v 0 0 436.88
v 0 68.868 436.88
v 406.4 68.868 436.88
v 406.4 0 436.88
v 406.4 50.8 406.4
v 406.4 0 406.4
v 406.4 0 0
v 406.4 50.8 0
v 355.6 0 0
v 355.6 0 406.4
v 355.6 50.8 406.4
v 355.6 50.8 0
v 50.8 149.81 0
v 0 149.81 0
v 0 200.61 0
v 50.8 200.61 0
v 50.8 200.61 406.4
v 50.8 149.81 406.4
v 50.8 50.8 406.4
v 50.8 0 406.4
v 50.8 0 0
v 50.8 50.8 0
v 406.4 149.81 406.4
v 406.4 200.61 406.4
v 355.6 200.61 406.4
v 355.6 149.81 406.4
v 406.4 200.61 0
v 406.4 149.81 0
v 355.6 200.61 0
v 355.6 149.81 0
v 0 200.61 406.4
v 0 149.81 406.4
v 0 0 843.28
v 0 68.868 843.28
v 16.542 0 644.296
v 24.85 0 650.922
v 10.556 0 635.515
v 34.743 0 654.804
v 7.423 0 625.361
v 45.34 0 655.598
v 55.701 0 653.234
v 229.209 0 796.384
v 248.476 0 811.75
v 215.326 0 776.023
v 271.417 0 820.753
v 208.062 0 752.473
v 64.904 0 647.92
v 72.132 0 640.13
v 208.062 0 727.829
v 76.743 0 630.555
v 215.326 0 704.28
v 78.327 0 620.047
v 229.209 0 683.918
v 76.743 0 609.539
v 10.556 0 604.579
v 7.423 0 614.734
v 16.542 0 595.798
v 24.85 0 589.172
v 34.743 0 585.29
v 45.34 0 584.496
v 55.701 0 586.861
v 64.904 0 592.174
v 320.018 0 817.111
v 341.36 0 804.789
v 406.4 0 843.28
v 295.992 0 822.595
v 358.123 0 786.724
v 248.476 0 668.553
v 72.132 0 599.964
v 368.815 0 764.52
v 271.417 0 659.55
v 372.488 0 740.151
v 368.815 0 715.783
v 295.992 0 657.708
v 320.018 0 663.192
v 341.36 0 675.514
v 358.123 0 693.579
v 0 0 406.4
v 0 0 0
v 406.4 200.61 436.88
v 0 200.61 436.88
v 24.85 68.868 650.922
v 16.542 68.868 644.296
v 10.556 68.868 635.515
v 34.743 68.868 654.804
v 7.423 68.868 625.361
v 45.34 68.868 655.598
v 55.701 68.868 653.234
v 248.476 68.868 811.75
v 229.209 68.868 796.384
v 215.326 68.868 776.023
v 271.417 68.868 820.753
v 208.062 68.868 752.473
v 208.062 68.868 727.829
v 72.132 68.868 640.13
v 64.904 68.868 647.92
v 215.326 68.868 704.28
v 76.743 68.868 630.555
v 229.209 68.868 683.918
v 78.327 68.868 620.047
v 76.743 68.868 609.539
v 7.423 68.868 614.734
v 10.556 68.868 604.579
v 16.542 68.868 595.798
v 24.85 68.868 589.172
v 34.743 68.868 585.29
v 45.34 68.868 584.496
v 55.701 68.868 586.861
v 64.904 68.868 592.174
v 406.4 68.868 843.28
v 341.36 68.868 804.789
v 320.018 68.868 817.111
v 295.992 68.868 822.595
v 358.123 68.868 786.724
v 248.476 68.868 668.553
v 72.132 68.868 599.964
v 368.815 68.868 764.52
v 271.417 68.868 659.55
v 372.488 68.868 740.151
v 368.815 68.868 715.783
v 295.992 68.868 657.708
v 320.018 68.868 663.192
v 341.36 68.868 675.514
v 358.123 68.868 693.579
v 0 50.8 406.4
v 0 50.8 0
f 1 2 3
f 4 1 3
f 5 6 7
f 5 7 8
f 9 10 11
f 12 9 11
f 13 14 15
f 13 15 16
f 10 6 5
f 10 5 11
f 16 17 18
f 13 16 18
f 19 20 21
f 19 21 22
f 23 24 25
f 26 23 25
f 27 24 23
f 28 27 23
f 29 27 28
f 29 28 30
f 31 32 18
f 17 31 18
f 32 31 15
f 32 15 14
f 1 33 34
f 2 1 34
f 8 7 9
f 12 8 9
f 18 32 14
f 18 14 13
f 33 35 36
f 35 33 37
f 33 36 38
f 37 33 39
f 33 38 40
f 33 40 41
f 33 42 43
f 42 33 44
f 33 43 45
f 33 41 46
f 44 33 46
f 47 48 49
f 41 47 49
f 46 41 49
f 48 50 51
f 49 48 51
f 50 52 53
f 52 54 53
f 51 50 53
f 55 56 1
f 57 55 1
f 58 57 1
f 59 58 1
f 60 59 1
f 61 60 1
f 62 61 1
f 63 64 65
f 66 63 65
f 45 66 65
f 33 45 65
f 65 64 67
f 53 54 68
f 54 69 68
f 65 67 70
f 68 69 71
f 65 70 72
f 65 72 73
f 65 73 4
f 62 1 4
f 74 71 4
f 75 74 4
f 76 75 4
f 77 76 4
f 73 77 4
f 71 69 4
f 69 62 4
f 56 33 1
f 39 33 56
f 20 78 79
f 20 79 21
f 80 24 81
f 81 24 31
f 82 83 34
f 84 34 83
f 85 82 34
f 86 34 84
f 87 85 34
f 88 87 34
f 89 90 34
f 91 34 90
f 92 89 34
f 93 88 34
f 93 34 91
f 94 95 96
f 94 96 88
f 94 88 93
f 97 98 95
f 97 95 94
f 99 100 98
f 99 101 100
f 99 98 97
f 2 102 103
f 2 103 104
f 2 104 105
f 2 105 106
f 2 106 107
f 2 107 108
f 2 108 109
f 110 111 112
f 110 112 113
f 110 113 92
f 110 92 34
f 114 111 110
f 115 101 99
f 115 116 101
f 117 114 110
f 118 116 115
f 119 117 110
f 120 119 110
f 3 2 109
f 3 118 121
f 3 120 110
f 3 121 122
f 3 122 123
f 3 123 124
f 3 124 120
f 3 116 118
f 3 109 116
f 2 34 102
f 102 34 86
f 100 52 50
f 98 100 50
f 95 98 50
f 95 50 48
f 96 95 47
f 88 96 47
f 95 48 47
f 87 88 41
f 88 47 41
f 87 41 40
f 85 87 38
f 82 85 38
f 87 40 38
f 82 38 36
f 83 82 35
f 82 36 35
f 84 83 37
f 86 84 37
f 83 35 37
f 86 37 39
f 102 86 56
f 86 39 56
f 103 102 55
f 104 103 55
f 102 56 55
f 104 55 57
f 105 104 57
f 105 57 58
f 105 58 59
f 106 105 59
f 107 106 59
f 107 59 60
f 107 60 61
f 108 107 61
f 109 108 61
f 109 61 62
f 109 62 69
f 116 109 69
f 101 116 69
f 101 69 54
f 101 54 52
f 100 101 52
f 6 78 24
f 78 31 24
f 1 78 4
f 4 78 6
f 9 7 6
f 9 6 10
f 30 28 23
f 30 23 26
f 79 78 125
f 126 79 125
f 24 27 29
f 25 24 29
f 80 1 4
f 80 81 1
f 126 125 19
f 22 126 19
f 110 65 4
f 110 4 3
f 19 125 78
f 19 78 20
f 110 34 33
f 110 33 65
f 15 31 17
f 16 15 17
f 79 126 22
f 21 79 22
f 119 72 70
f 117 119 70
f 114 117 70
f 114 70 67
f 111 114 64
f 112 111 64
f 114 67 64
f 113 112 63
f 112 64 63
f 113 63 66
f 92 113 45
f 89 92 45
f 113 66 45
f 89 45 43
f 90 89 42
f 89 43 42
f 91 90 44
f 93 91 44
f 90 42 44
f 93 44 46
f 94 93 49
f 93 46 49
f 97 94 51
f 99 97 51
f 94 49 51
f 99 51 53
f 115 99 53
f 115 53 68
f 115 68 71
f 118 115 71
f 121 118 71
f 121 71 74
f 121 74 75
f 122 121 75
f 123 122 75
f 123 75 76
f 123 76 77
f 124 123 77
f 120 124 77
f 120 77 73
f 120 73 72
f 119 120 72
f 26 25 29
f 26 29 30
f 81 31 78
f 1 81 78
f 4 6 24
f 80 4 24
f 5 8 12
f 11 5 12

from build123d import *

# Parameters (mm, degrees)
F0_W      = 50.8
F0_H      = 50.8
F1_DEPTH  = 406.4
F2_W      = 203.2
F2_H      = 100.3052477596
F7_DEPTH  = 30.48
F8_W      = 406.4
F8_H      = 68.8679218292
F9_DEPTH  = 406.4
F10_R     = 35.6509847578
F11_DEPTH = 193.04
F10_R_2   = 82.67461481


with BuildPart() as f1:
    # F0 (on Top) → F1 (new body)
    with BuildSketch(Plane.XY):
        with Locations((25.4, 25.4)):
            Rectangle(F0_W, F0_H)
    extrude(amount=F1_DEPTH)


with BuildPart() as f5_1:
    # F5: instance of F1
    add(f1.part.mirror(Plane.YZ.offset(203.2)))


with BuildPart() as f6_1:
    # F6: instance of F5_1
    add(f5_1.part.mirror(Plane.XZ.offset(-100.3052477596)))


with BuildPart() as f6_2:
    # F6: instance of F1
    add(f1.part.mirror(Plane.XZ.offset(-100.3052477596)))


with BuildPart() as f7:
    # F2 (on face) → F7 (new body)
    with BuildSketch(Plane.XY.offset(406.4)):
        with Locations((101.6, 50.1526238798)):
            Rectangle(F2_W, F2_H)
        with Locations((304.8, 50.1526238798)):
            Rectangle(F2_W, F2_H)
        with Locations((101.6, 150.4578716394)):
            Rectangle(F2_W, F2_H)
        with Locations((304.8, 150.4578716394)):
            Rectangle(F2_W, F2_H)
    extrude(amount=F7_DEPTH)


with BuildPart() as f9:
    # F8 (on face) → F9 (new body)
    with BuildSketch(Plane.XY.offset(436.88)):
        with Locations((203.2, 34.4339609146)):
            Rectangle(F8_W, F8_H)
    extrude(amount=F9_DEPTH)


with BuildPart() as f11:
    # F10 (on face) → F11 (new body)
    with BuildSketch(Plane.XZ):
        with Locations((42.6759459078, 620.0470924377)):
            Circle(F10_R)
    extrude(amount=-F11_DEPTH)


with BuildPart() as f11b:
    # F10 (on face) → F11, piece 2 (new body)
    with BuildSketch(Plane.XZ):
        with Locations((289.8136973381, 740.1514053345)):
            Circle(F10_R_2)
    extrude(amount=-F11_DEPTH)


with BuildPart() as f9_1:
    add(f9.part)

    # F12: cut F11b, F11
    add(f11b.part, mode=Mode.SUBTRACT)
    add(f11.part, mode=Mode.SUBTRACT)


solid = Compound([f1.part, f5_1.part, f6_1.part, f6_2.part, f7.part, f9_1.part])
